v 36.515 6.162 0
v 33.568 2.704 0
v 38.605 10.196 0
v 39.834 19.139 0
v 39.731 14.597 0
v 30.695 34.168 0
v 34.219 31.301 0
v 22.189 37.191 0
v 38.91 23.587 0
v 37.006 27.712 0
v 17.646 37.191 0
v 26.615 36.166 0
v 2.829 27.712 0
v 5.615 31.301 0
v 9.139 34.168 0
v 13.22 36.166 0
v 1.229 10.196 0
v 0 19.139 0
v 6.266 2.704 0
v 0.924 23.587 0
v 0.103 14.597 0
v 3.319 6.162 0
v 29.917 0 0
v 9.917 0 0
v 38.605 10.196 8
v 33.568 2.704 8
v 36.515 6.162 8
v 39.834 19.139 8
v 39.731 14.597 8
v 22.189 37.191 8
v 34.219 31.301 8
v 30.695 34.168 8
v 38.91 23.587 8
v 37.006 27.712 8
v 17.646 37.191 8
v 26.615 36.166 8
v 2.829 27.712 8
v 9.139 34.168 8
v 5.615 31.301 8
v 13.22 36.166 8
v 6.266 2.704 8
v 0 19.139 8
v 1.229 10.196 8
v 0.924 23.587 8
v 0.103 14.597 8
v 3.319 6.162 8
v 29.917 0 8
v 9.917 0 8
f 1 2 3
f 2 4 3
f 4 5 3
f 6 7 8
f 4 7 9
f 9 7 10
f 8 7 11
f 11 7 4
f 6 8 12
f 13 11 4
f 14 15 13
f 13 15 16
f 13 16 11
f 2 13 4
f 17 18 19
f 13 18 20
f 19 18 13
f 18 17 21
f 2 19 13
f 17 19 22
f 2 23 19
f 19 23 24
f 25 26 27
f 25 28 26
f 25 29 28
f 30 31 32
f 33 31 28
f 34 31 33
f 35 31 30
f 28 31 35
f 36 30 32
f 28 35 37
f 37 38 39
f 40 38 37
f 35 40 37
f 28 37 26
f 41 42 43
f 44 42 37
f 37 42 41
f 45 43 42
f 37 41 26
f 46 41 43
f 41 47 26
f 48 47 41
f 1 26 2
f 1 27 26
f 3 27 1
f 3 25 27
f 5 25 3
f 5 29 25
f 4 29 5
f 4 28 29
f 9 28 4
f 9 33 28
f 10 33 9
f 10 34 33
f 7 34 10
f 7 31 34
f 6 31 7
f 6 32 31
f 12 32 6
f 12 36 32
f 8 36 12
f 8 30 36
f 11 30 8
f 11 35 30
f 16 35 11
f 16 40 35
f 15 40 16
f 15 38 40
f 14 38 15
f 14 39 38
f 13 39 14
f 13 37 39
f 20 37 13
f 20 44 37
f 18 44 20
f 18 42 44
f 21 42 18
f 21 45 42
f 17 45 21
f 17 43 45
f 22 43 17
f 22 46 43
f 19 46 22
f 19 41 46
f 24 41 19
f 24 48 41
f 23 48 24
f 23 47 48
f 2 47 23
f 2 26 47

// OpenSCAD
$fn = 32;

// ----------------------------------------------------------------------
// Flat adaptor: single_d, 8 mm thick
// ----------------------------------------------------------------------

// --- parameters (mm) ---
profile_height = 8;       // extrusion height
profile_points = 24;      // points of the closed outline

profile = [[29.917, 0], [33.568, 2.704], [36.515, 6.162], [38.605, 10.196], [39.731, 14.597], [39.834, 19.139], [38.91, 23.587], [37.006, 27.712], [34.219, 31.301], [30.695, 34.168], [26.615, 36.166], [22.189, 37.191], [17.646, 37.191], [13.22, 36.166], [9.139, 34.168], [5.615, 31.301], [2.829, 27.712], [0.924, 23.587], [0, 19.139], [0.103, 14.597], [1.229, 10.196], [3.319, 6.162], [6.266, 2.704], [9.917, 0]];  // single closed polygon, 24 points, counter clockwise

// --- the one profile operation ---
linear_extrude(height = profile_height) polygon(points = profile);
